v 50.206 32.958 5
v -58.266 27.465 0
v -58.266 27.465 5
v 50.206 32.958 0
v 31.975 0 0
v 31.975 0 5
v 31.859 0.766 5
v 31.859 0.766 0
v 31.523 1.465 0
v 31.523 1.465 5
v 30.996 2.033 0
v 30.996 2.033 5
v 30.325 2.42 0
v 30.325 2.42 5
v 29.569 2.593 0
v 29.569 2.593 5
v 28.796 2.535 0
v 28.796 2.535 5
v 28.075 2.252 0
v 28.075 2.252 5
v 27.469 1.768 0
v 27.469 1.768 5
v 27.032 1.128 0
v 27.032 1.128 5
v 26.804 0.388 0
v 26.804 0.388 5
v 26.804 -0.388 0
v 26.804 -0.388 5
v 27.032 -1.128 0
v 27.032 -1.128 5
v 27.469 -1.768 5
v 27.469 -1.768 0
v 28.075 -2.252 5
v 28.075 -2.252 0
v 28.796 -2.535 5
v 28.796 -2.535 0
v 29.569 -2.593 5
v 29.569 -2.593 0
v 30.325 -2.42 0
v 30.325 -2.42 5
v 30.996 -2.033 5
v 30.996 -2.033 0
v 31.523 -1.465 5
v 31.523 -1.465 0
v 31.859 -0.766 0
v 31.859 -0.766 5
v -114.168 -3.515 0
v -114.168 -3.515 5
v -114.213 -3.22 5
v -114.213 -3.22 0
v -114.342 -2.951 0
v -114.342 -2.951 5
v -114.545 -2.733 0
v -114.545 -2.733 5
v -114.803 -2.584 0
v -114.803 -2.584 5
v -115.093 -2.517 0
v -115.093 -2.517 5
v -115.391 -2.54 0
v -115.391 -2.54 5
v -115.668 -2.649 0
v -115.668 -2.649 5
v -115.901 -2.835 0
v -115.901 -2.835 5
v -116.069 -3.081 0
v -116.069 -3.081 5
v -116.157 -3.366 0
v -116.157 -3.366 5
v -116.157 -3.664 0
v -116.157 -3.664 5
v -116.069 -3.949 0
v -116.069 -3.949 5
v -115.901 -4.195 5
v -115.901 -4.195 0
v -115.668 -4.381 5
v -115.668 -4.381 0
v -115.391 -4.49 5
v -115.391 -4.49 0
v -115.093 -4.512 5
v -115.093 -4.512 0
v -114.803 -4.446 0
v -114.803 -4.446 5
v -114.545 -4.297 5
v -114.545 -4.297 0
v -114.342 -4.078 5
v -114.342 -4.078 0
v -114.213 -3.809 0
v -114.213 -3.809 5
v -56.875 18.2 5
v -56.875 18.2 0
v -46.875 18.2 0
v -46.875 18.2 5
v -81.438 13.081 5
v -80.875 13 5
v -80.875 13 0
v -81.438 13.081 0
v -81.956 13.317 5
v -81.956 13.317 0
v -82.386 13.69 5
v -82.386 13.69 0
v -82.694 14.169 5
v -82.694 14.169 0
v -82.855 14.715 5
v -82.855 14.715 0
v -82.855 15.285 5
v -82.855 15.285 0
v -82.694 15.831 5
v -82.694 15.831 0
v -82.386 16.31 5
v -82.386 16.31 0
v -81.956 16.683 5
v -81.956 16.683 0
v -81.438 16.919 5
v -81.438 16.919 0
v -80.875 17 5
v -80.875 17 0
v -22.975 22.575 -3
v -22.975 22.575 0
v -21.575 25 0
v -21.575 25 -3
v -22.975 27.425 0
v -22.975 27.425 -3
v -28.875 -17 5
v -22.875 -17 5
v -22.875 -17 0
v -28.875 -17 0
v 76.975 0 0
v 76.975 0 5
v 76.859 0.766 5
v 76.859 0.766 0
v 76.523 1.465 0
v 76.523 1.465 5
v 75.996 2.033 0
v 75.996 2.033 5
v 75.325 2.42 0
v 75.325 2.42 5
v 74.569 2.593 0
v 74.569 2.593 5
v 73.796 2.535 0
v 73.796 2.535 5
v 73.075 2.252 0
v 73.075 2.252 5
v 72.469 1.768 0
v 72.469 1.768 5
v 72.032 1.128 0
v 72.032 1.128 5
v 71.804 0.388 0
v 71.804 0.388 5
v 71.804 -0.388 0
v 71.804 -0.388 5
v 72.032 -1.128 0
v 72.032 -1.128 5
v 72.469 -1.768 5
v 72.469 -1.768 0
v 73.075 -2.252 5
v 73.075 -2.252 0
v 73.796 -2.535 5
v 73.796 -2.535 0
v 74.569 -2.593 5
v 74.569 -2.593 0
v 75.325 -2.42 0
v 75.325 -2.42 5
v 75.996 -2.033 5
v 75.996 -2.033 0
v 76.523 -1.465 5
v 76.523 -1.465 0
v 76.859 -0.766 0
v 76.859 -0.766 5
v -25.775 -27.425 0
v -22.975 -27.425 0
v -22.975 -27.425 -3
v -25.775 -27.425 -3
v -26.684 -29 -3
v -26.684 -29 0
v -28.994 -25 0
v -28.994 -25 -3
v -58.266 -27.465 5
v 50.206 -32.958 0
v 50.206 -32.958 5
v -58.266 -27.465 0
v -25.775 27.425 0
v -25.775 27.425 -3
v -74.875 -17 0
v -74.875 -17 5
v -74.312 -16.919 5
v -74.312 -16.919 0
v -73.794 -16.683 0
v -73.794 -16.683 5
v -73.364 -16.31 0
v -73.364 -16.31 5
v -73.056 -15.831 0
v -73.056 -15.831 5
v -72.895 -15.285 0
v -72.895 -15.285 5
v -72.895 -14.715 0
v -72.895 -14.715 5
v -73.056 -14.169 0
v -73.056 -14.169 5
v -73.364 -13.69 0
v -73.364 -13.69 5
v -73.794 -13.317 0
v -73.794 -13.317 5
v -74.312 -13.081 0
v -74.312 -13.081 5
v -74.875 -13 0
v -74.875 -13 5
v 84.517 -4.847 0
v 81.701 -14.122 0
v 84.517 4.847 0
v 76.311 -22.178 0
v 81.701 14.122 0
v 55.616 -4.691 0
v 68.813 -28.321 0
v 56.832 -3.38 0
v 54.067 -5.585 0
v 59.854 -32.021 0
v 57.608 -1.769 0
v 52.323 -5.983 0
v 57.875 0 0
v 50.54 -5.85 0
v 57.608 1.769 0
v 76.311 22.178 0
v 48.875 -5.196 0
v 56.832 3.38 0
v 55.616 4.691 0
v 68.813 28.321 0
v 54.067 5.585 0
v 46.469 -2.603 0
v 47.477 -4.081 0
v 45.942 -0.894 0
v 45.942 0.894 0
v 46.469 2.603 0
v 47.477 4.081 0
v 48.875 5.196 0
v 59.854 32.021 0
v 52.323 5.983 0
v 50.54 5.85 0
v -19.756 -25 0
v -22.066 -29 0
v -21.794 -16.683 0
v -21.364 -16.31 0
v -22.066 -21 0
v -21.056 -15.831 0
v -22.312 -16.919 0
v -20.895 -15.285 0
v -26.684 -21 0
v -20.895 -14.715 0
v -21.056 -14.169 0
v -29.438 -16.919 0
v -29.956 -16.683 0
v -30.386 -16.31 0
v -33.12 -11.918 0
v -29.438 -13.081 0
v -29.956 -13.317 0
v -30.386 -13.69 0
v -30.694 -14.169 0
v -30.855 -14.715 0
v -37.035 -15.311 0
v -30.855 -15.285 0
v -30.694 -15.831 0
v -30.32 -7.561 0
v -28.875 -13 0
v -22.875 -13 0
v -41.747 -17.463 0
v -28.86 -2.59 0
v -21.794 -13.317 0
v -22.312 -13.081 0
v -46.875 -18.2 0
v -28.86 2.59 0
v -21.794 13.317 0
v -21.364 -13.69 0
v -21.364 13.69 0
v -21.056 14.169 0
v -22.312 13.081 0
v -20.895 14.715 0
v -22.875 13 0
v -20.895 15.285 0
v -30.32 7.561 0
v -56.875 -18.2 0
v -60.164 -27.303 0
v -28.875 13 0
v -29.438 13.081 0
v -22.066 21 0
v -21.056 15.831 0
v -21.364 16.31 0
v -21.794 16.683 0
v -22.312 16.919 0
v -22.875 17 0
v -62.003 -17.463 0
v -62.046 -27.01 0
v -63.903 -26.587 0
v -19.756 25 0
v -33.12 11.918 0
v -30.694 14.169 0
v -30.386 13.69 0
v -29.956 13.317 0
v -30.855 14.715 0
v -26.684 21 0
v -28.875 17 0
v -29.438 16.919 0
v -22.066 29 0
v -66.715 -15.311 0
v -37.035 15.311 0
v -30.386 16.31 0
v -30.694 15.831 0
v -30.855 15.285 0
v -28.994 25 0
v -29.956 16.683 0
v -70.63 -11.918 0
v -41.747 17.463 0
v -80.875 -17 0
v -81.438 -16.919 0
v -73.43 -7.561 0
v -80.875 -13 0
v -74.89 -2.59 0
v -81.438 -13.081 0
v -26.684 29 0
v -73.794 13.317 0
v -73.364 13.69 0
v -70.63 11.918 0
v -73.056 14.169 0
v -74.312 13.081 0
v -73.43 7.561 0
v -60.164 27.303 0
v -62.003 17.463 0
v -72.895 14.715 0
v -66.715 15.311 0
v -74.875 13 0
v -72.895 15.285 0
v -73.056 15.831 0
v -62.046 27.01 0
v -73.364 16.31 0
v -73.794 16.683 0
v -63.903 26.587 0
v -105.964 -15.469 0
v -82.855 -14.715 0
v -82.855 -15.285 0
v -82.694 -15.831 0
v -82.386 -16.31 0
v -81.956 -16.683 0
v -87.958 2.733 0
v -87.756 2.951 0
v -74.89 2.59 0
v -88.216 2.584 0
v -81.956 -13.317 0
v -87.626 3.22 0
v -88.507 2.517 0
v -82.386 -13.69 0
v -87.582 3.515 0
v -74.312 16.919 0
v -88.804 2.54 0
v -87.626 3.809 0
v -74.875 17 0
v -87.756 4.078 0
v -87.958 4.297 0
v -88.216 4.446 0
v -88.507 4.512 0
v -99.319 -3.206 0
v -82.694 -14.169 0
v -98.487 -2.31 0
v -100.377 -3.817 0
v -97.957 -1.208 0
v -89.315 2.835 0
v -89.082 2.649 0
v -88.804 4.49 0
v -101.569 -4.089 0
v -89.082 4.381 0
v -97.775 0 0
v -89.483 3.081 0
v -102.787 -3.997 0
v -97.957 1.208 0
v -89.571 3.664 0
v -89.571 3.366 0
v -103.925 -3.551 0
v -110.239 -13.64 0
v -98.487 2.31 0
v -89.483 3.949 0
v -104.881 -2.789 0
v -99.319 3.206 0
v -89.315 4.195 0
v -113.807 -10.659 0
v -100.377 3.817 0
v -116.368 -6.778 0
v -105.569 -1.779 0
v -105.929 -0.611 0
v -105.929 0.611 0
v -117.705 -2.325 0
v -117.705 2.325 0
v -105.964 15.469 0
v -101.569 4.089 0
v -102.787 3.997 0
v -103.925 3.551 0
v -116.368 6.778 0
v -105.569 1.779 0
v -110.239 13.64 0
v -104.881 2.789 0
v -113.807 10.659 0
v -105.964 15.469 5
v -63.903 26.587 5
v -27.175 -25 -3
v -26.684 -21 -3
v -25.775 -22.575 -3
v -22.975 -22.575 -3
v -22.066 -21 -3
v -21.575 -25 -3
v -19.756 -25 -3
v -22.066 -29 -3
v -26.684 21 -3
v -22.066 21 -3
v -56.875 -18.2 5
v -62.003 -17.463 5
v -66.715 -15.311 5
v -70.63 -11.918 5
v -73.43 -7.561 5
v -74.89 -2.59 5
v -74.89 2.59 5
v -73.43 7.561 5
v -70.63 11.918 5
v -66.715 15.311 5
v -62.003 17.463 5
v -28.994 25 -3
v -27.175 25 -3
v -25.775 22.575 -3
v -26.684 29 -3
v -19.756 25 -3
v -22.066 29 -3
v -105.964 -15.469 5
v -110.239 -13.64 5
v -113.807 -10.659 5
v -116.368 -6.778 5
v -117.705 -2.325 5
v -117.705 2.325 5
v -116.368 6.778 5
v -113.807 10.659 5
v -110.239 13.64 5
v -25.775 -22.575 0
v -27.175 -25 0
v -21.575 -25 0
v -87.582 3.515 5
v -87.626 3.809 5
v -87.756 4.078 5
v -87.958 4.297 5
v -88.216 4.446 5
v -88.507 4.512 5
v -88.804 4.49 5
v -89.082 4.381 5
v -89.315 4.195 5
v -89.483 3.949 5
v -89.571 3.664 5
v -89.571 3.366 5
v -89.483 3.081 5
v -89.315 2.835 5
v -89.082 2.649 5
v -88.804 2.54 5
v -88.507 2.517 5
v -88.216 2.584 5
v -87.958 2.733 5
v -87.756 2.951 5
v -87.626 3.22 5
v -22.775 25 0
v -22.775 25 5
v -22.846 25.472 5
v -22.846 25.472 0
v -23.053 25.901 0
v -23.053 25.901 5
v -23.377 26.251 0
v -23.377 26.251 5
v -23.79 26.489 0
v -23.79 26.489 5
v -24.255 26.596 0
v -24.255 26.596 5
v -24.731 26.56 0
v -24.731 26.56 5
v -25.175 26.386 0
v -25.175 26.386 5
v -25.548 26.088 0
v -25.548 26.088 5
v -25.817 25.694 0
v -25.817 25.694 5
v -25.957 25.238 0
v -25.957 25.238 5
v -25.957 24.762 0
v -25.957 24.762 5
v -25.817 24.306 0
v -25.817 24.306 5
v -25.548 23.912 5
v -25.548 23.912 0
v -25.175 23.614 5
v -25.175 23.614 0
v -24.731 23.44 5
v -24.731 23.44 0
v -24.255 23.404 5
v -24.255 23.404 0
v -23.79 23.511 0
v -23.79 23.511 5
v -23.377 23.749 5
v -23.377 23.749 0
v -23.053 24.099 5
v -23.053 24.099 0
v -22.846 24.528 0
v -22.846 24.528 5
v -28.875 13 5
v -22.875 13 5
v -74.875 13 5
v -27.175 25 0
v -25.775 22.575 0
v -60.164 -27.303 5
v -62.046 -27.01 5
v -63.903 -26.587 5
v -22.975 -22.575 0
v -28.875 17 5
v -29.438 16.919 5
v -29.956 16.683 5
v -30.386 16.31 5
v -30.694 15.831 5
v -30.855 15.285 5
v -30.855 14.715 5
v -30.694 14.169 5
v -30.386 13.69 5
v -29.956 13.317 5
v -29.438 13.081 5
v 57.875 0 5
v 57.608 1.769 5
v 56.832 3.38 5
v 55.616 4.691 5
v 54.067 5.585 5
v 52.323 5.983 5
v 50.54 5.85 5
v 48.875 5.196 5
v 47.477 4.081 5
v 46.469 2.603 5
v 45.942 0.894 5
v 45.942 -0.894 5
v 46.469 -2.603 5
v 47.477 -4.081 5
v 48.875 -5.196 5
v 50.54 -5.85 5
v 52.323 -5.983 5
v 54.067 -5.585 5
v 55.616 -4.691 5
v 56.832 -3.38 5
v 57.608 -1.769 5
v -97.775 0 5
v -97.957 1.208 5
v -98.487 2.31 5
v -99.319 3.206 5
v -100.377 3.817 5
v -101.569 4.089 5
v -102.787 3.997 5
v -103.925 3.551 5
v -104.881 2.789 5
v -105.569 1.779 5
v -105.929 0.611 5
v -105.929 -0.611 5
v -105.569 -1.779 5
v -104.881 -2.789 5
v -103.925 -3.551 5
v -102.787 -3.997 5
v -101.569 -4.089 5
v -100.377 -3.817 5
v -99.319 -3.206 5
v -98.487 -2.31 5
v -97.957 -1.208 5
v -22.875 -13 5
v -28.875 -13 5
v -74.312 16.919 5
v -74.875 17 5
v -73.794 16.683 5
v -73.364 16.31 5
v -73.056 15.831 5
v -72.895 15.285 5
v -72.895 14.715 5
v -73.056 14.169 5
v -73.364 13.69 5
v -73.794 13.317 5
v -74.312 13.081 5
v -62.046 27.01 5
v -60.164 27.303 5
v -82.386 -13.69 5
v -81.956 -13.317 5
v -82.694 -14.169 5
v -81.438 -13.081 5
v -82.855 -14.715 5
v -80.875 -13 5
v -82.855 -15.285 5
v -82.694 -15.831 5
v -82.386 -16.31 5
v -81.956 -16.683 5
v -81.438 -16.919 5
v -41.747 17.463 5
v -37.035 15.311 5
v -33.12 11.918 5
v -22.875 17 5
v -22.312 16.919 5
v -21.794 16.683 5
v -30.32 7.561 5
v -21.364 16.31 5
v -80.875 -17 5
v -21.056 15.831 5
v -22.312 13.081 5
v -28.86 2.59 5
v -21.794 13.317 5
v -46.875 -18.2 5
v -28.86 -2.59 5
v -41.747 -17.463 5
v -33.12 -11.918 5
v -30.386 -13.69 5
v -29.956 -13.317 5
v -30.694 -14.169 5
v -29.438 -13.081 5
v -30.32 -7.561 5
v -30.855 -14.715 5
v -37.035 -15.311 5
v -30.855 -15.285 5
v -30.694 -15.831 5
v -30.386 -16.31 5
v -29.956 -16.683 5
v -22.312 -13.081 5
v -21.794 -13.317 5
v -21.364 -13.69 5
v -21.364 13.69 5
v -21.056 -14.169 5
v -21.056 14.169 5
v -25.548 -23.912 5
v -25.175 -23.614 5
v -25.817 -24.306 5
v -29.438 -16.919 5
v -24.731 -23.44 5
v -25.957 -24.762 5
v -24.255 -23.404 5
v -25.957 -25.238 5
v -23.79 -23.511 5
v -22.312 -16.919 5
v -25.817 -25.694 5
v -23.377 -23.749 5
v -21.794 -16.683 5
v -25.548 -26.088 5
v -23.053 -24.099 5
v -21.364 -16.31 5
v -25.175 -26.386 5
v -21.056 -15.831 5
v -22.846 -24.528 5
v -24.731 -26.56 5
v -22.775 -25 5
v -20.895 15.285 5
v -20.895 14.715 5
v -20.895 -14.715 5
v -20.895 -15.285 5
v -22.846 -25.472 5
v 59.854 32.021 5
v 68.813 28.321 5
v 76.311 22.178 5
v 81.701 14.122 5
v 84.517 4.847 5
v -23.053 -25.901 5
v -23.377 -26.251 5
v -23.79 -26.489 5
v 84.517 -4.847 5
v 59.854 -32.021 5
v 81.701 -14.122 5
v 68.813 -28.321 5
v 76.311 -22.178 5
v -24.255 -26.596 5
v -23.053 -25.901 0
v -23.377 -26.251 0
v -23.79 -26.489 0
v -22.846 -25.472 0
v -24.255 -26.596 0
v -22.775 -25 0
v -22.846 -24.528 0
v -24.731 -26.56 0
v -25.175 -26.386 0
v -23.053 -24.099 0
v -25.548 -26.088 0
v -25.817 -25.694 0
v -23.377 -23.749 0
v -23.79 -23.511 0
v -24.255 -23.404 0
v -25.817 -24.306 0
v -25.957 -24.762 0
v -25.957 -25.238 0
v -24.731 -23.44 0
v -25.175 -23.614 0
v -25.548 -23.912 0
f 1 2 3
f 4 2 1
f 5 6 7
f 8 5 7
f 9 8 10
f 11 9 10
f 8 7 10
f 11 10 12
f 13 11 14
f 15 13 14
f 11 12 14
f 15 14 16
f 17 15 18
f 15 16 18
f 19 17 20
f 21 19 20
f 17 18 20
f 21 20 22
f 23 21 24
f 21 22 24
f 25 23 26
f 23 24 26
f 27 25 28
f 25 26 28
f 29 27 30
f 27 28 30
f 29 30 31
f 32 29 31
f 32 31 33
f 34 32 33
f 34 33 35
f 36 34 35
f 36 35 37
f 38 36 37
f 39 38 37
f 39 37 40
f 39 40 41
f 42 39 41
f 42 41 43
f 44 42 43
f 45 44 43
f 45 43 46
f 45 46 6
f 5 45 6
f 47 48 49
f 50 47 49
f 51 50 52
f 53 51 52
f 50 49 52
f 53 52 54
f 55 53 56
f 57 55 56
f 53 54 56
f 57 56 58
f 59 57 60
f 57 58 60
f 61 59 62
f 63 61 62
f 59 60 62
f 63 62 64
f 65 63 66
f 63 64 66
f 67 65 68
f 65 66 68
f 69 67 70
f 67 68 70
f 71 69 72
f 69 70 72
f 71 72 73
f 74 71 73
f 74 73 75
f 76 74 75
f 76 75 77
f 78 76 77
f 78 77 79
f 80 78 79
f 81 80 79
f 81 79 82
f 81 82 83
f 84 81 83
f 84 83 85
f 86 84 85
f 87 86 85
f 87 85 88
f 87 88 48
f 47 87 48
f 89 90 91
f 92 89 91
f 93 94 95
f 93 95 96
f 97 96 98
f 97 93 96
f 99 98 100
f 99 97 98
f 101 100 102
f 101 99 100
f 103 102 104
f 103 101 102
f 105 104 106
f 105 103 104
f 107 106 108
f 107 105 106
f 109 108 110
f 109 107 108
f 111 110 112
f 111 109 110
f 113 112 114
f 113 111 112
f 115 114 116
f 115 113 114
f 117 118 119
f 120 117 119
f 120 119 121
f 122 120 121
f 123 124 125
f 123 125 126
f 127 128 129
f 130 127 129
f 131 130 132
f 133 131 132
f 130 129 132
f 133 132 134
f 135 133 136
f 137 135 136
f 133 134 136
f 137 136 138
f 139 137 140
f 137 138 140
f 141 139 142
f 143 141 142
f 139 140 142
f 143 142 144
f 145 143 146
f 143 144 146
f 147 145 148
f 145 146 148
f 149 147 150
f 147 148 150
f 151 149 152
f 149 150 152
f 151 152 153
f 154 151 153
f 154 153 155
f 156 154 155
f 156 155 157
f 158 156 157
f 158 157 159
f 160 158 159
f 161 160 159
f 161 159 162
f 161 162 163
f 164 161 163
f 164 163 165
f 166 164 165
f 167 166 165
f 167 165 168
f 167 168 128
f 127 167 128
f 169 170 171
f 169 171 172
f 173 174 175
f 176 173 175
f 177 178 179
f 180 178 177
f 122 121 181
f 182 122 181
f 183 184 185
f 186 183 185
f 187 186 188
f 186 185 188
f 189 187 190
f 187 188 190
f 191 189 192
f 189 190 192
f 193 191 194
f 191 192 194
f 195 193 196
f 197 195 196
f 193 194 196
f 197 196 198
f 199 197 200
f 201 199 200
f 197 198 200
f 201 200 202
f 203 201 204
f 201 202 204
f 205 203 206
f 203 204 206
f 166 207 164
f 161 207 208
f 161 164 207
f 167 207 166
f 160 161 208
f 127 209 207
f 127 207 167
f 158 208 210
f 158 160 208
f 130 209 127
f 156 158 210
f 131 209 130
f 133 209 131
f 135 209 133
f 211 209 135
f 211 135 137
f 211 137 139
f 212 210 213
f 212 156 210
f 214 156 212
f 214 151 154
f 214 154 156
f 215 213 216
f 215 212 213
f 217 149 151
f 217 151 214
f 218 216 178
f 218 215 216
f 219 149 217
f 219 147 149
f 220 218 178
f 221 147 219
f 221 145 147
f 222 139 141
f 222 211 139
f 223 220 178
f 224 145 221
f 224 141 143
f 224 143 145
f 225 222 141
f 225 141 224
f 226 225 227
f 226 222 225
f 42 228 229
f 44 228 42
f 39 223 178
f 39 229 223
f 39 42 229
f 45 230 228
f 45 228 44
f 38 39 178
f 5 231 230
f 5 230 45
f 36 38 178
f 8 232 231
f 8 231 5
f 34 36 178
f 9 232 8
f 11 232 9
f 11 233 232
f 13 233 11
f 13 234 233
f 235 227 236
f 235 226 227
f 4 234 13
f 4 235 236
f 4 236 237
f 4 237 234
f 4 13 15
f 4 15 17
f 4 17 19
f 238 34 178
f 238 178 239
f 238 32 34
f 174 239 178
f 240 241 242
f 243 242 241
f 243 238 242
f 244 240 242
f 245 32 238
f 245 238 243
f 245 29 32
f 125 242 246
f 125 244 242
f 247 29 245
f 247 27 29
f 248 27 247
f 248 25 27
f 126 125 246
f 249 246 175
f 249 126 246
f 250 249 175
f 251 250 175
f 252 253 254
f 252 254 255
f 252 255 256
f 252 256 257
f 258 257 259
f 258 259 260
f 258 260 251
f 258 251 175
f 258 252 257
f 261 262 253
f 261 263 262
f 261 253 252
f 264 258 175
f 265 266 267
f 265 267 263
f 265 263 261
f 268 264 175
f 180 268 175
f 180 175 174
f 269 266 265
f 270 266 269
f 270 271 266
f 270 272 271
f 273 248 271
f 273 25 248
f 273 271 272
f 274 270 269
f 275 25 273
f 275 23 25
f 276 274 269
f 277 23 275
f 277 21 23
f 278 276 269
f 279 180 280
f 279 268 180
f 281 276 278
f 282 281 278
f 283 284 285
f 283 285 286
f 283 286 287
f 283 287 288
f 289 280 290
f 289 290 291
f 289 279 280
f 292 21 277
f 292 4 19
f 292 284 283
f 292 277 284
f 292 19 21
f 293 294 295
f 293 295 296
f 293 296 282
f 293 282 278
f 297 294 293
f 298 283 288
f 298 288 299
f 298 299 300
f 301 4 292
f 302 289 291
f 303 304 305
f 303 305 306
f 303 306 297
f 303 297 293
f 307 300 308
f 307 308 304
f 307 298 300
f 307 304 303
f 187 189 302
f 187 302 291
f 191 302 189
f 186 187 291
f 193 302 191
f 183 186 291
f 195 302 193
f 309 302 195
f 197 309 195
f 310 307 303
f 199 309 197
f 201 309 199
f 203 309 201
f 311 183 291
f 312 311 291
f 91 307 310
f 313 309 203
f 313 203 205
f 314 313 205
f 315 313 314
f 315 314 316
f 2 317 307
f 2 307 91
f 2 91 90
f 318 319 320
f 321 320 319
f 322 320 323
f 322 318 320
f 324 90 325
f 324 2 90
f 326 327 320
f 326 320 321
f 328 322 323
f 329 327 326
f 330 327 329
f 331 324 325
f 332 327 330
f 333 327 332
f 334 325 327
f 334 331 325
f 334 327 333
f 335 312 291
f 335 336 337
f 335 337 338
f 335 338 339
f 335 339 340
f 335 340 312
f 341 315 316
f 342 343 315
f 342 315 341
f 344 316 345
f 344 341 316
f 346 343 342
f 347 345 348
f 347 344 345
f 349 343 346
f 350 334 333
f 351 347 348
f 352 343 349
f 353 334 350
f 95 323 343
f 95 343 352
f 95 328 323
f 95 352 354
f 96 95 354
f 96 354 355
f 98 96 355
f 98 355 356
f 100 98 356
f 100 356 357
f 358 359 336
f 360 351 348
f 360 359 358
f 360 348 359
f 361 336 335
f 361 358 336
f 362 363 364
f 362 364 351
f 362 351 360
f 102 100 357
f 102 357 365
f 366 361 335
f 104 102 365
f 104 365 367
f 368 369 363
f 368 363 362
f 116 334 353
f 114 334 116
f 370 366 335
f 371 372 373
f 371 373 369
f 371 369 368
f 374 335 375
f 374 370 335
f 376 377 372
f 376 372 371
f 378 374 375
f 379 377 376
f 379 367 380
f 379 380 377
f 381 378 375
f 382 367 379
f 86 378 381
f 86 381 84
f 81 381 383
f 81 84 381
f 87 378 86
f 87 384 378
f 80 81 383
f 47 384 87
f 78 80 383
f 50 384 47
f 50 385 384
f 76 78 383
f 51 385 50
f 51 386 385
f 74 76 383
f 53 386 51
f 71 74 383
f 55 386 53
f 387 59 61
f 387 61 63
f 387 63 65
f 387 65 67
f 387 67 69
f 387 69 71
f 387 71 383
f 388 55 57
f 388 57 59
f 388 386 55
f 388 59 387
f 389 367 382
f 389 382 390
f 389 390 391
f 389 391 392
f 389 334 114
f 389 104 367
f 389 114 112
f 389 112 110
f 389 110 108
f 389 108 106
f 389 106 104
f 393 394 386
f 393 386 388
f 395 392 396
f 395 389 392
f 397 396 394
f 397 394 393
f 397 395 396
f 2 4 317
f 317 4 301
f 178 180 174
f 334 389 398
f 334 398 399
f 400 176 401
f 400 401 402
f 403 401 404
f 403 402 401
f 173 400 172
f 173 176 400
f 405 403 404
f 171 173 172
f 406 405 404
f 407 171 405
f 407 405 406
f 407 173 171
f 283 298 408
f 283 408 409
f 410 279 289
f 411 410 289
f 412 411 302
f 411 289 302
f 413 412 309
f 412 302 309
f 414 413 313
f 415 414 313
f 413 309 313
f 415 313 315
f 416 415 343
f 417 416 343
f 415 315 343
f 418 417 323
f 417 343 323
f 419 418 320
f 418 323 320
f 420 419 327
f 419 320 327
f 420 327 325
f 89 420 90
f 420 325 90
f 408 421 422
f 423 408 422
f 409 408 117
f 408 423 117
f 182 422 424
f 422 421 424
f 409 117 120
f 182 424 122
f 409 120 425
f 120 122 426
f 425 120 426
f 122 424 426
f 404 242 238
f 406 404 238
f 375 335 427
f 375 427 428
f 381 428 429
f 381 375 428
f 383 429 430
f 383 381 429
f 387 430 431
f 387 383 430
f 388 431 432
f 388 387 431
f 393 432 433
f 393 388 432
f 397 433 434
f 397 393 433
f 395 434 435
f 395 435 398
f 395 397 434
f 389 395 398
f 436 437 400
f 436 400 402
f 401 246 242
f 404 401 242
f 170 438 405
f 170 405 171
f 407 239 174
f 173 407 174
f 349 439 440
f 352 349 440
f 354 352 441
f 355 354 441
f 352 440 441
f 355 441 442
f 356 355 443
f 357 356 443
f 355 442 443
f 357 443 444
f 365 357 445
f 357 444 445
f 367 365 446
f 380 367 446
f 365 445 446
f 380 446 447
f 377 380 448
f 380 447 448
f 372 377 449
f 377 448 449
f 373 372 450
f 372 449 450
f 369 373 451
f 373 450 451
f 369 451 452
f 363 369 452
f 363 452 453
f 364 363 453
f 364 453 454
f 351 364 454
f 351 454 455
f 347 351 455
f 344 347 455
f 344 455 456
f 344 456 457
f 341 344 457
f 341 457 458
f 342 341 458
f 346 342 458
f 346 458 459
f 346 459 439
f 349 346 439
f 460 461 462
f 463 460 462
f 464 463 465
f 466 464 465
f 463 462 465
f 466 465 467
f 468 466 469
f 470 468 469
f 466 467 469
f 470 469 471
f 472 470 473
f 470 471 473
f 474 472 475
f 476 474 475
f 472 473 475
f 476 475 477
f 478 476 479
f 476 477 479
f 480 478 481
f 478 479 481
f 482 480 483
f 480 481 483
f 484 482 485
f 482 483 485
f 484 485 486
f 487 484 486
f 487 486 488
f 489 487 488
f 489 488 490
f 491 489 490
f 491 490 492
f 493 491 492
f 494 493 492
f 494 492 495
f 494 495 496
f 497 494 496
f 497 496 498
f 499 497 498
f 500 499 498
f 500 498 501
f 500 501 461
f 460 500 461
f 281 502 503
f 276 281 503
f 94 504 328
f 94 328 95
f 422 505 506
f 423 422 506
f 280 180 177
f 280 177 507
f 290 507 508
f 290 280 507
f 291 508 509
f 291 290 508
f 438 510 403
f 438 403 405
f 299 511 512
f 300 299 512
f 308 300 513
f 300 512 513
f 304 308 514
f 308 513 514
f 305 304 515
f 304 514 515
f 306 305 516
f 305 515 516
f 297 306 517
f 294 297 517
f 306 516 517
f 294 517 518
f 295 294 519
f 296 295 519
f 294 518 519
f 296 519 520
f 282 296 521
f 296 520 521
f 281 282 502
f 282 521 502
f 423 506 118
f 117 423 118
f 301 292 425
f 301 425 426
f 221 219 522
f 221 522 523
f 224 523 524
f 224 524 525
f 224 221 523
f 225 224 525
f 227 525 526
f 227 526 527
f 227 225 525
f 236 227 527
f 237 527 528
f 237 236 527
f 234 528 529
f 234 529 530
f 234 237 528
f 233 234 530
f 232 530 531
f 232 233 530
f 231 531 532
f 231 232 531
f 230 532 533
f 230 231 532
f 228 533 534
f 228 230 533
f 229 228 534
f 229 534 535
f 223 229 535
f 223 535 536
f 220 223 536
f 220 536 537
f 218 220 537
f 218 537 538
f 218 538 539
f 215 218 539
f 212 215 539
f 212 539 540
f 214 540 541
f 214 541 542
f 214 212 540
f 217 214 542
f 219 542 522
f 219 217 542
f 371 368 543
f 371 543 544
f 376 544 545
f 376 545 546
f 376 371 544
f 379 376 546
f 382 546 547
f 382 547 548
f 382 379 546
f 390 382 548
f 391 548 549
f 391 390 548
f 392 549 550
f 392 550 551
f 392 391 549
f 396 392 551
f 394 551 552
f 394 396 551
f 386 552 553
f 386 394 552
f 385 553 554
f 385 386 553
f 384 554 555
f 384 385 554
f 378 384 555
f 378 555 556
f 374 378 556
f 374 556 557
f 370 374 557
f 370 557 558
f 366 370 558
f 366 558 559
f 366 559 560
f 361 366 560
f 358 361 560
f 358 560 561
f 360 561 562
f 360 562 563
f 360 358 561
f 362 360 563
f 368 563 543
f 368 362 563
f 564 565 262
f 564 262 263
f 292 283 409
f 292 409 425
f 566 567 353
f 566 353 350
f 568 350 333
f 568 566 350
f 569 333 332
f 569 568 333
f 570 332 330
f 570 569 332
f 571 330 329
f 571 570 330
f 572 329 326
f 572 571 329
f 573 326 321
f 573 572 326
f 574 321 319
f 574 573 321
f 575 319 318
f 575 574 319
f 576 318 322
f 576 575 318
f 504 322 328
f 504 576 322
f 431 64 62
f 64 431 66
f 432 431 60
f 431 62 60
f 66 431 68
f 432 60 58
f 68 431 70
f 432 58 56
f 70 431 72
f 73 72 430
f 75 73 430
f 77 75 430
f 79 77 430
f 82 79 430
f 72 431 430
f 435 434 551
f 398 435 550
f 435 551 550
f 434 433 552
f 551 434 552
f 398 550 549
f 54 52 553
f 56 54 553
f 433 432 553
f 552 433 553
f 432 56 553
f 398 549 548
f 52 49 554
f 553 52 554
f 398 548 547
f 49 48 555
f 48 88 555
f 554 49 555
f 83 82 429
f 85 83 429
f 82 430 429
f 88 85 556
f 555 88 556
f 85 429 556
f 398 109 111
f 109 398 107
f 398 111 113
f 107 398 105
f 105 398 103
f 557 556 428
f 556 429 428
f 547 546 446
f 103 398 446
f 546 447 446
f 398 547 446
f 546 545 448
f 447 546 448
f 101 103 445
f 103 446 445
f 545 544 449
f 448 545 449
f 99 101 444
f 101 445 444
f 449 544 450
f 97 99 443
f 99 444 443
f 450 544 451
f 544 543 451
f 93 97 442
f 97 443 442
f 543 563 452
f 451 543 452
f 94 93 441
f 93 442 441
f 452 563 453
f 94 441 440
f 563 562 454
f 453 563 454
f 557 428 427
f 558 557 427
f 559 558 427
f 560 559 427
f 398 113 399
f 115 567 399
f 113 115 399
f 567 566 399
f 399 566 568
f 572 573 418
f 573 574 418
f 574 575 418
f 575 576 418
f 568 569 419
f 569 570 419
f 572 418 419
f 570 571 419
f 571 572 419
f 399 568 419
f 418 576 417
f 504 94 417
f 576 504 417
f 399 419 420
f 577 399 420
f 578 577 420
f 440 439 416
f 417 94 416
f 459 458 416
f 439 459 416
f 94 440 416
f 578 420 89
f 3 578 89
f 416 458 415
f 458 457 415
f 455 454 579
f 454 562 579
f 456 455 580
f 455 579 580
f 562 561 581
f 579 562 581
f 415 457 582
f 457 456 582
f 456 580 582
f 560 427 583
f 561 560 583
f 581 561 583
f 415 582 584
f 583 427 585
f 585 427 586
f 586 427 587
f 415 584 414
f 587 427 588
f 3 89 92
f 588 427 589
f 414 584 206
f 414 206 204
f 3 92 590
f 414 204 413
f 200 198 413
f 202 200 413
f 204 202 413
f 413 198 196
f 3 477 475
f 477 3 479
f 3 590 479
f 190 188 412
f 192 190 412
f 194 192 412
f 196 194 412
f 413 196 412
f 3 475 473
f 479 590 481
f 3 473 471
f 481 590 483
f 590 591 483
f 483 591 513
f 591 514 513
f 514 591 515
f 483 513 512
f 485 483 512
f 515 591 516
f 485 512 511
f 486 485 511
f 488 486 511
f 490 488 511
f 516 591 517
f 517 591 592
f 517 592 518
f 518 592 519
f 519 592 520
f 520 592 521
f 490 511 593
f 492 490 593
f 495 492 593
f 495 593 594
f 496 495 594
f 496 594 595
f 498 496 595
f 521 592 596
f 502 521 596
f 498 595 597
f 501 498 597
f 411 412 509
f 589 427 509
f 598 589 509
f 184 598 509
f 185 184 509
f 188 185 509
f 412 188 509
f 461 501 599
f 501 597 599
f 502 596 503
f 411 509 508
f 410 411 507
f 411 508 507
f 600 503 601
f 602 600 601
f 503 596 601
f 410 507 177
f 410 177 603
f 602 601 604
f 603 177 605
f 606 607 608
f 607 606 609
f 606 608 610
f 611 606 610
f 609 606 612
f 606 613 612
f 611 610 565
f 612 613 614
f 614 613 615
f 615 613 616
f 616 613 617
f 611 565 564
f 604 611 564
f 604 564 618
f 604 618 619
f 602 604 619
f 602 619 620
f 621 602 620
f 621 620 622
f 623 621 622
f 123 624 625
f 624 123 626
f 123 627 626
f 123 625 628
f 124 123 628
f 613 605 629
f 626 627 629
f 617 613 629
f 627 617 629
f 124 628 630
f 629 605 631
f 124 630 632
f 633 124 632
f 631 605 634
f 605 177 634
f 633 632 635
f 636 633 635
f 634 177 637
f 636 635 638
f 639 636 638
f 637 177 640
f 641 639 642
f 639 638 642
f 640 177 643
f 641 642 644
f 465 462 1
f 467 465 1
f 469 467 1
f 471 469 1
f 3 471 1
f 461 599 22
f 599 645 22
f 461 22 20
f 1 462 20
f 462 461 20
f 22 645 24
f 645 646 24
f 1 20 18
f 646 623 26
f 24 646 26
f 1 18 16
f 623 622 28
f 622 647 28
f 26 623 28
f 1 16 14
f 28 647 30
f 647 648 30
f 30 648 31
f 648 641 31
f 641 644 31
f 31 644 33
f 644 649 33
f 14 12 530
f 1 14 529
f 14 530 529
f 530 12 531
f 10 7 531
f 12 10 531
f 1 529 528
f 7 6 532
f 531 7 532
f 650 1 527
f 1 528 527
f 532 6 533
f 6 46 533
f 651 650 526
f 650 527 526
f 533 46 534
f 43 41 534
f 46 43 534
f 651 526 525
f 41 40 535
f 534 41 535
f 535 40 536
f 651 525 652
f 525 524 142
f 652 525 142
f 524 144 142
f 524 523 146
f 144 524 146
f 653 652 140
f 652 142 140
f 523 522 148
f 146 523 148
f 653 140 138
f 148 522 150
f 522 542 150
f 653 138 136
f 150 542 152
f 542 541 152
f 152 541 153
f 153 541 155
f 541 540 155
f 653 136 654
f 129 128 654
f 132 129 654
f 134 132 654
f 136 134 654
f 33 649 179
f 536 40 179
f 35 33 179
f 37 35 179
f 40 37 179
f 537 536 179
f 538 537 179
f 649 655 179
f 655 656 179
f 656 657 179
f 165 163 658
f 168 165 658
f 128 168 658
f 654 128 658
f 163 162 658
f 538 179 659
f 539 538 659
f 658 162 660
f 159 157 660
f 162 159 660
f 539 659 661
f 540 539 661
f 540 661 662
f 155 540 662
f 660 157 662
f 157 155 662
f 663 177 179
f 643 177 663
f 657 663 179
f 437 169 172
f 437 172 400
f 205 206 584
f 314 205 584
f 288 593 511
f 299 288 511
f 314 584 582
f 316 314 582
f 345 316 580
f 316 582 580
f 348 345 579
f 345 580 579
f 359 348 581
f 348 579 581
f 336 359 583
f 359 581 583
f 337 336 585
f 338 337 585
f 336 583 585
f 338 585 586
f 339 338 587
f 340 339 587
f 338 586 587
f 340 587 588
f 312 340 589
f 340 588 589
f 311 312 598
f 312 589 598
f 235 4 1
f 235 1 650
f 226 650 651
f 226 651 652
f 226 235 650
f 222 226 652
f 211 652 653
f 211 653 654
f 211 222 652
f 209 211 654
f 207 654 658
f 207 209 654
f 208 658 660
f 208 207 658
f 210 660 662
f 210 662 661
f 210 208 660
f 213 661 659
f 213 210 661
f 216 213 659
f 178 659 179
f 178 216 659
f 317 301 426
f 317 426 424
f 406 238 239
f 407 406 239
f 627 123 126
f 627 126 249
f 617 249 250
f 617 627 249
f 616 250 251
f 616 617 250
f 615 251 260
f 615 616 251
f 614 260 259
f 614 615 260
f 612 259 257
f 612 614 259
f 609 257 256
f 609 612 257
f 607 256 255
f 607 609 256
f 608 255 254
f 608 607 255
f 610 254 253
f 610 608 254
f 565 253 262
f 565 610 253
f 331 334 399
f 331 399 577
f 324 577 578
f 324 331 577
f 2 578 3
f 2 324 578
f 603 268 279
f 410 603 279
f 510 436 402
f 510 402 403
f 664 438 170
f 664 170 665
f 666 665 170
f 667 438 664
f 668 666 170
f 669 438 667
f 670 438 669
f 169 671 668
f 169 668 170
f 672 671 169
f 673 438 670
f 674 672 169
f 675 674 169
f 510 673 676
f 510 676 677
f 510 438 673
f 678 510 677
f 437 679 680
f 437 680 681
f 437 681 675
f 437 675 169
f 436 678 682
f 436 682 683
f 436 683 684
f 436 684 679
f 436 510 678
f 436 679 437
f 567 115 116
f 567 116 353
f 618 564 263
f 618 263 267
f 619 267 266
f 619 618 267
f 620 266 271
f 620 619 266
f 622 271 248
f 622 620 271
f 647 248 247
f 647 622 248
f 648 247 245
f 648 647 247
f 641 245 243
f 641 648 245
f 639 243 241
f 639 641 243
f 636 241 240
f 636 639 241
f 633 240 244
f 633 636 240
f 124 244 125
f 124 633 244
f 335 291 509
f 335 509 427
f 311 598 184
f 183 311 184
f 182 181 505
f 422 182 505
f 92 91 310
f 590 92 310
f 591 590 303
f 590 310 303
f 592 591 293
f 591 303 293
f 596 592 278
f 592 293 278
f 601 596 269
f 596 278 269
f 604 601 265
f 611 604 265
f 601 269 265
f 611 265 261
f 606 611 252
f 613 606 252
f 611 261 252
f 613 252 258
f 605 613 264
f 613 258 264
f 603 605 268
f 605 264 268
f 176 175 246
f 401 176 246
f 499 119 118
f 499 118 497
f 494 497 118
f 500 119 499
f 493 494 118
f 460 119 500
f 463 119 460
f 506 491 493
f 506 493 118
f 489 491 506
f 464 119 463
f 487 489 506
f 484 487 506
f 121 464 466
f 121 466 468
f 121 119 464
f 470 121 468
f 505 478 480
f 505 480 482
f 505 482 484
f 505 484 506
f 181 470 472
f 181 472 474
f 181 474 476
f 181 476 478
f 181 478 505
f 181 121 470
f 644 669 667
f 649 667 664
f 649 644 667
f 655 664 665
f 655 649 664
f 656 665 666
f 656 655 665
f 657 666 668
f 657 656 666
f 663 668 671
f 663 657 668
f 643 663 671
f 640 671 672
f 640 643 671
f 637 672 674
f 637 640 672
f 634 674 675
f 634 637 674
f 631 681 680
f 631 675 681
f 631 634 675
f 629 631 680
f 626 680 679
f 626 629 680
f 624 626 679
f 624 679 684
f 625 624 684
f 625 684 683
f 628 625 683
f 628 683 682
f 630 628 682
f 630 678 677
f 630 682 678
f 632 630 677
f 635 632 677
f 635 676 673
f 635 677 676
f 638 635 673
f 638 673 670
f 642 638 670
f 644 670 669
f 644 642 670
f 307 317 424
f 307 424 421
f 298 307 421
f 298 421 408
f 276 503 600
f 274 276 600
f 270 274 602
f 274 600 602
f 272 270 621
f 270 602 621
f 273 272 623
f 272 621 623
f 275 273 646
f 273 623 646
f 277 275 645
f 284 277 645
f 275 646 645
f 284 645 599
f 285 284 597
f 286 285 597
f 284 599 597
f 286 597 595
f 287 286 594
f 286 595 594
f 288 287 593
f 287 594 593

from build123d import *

# Parameters (mm, degrees)
SKETCH1_R           = 4.1
SKETCH1_R_2         = 6
BOSS_EXTRUDE1_DEPTH = 5
SKETCH7_R           = 2.6
CUT_EXTRUDE1_DEPTH  = 7
BOSS_EXTRUDE7_DEPTH = 8
SKETCH9_R           = 1.6
CUT_EXTRUDE2_DEPTH  = 7
CUT_EXTRUDE3_DEPTH  = 10
SKETCH11_R          = 1
CUT_EXTRUDE4_DEPTH  = 10


with BuildPart() as part:
    # Sketch1 → Boss-Extrude1 (new body)
    with BuildSketch(Plane.XY):
        with BuildLine():
            Line((50.206034483, 32.957769253), (-58.265804598, 27.46480771))
            ThreePointArc((-58.265804598, 27.46480771), (-61.107119662, 27.172397082), (-63.902777778, 26.586845234))
            Line((-63.902777778, 26.586845234), (-105.963888889, 15.468709954))
            ThreePointArc((-105.963888889, 15.468709954), (-117.875, 0), (-105.963888889, -15.468709954))
            Line((-105.963888889, -15.468709954), (-63.902777778, -26.586845234))
            ThreePointArc((-63.902777778, -26.586845234), (-61.107119662, -27.172397082), (-58.265804598, -27.46480771))
            Line((-58.265804598, -27.46480771), (50.206034483, -32.957769253))
            ThreePointArc((50.206034483, -32.957769253), (84.875, 0), (50.206034483, 32.957769253))
        make_face()
        with Locations((-101.875, 0)):
            Circle(SKETCH1_R, mode=Mode.SUBTRACT)
        with BuildLine():
            ThreePointArc((-46.875, 18.2), (-28.675, 0), (-46.875, -18.2))
            Line((-46.875, -18.2), (-56.875, -18.2))
            ThreePointArc((-56.875, -18.2), (-75.075, 0), (-56.875, 18.2))
            Line((-56.875, 18.2), (-46.875, 18.2))
        make_face(mode=Mode.SUBTRACT)
        with Locations((51.875, 0)):
            Circle(SKETCH1_R_2, mode=Mode.SUBTRACT)
    extrude(amount=BOSS_EXTRUDE1_DEPTH)

    # Sketch7 → Cut-Extrude1 (cut)
    with BuildSketch(Plane.XY.offset(5)):
        with Locations((29.375, 0)):
            Circle(SKETCH7_R)
        with Locations((74.375, 0)):
            Circle(SKETCH7_R)
    extrude(amount=-CUT_EXTRUDE1_DEPTH, mode=Mode.SUBTRACT)

    # Sketch8 → Boss-Extrude7 (add)
    with BuildSketch(Plane.XY.offset(5)):
        Polygon((-28.993802154, 25), (-26.684401077, 21), (-22.065598923, 21), (-19.756197846, 25), (-22.065598923, 29), (-26.684401077, 29), align=None)
        Polygon((-25.775, 27.424871131), (-27.175, 25), (-25.775, 22.575128869), (-22.975, 22.575128869), (-21.575, 25), (-22.975, 27.424871131), align=None, mode=Mode.SUBTRACT)
    boss_extrude7 = extrude(amount=-BOSS_EXTRUDE7_DEPTH)

    # Sketch9 → Cut-Extrude2 (cut)
    with BuildSketch(Plane.XY.offset(5)):
        with Locations((-24.375, 25)):
            Circle(SKETCH9_R)
    cut_extrude2 = extrude(amount=-CUT_EXTRUDE2_DEPTH, mode=Mode.SUBTRACT)

    # Mirror1: Boss-Extrude7 across plane
    add(boss_extrude7.mirror(Plane.ZX))

    # Mirror2: Cut-Extrude2 across plane
    add(cut_extrude2.mirror(Plane.ZX), mode=Mode.SUBTRACT)

    # Sketch10 → Cut-Extrude3 (cut)
    with BuildSketch(Plane.XY.offset(5)):
        with BuildLine():
            Line((-80.875, 13), (-74.875, 13))
            ThreePointArc((-74.875, 13), (-72.875, 15), (-74.875, 17))
            Line((-74.875, 17), (-80.875, 17))
            ThreePointArc((-80.875, 17), (-82.875, 15), (-80.875, 13))
        make_face()
        with BuildLine():
            ThreePointArc((-74.875, -13), (-72.875, -15), (-74.875, -17))
            Line((-74.875, -17), (-80.875, -17))
            ThreePointArc((-80.875, -17), (-82.875, -15), (-80.875, -13))
            Line((-80.875, -13), (-74.875, -13))
        make_face()
        with BuildLine():
            Line((-22.875, -13), (-28.875, -13))
            ThreePointArc((-28.875, -13), (-30.875, -15), (-28.875, -17))
            Line((-28.875, -17), (-22.875, -17))
            ThreePointArc((-22.875, -17), (-20.875, -15), (-22.875, -13))
        make_face()
        with BuildLine():
            ThreePointArc((-28.875, 13), (-30.875, 15), (-28.875, 17))
            Line((-28.875, 17), (-22.875, 17))
            ThreePointArc((-22.875, 17), (-20.875, 15), (-22.875, 13))
            Line((-22.875, 13), (-28.875, 13))
        make_face()
    extrude(amount=-CUT_EXTRUDE3_DEPTH, mode=Mode.SUBTRACT)

    # Sketch11 → Cut-Extrude4 (cut)
    with BuildSketch(Plane.XY.offset(5)):
        with Locations((-115.168208365, -3.514699328)):
            Circle(SKETCH11_R)
        with Locations((-88.581791635, 3.514699328)):
            Circle(SKETCH11_R)
    extrude(amount=-CUT_EXTRUDE4_DEPTH, mode=Mode.SUBTRACT)


solid = part.part
